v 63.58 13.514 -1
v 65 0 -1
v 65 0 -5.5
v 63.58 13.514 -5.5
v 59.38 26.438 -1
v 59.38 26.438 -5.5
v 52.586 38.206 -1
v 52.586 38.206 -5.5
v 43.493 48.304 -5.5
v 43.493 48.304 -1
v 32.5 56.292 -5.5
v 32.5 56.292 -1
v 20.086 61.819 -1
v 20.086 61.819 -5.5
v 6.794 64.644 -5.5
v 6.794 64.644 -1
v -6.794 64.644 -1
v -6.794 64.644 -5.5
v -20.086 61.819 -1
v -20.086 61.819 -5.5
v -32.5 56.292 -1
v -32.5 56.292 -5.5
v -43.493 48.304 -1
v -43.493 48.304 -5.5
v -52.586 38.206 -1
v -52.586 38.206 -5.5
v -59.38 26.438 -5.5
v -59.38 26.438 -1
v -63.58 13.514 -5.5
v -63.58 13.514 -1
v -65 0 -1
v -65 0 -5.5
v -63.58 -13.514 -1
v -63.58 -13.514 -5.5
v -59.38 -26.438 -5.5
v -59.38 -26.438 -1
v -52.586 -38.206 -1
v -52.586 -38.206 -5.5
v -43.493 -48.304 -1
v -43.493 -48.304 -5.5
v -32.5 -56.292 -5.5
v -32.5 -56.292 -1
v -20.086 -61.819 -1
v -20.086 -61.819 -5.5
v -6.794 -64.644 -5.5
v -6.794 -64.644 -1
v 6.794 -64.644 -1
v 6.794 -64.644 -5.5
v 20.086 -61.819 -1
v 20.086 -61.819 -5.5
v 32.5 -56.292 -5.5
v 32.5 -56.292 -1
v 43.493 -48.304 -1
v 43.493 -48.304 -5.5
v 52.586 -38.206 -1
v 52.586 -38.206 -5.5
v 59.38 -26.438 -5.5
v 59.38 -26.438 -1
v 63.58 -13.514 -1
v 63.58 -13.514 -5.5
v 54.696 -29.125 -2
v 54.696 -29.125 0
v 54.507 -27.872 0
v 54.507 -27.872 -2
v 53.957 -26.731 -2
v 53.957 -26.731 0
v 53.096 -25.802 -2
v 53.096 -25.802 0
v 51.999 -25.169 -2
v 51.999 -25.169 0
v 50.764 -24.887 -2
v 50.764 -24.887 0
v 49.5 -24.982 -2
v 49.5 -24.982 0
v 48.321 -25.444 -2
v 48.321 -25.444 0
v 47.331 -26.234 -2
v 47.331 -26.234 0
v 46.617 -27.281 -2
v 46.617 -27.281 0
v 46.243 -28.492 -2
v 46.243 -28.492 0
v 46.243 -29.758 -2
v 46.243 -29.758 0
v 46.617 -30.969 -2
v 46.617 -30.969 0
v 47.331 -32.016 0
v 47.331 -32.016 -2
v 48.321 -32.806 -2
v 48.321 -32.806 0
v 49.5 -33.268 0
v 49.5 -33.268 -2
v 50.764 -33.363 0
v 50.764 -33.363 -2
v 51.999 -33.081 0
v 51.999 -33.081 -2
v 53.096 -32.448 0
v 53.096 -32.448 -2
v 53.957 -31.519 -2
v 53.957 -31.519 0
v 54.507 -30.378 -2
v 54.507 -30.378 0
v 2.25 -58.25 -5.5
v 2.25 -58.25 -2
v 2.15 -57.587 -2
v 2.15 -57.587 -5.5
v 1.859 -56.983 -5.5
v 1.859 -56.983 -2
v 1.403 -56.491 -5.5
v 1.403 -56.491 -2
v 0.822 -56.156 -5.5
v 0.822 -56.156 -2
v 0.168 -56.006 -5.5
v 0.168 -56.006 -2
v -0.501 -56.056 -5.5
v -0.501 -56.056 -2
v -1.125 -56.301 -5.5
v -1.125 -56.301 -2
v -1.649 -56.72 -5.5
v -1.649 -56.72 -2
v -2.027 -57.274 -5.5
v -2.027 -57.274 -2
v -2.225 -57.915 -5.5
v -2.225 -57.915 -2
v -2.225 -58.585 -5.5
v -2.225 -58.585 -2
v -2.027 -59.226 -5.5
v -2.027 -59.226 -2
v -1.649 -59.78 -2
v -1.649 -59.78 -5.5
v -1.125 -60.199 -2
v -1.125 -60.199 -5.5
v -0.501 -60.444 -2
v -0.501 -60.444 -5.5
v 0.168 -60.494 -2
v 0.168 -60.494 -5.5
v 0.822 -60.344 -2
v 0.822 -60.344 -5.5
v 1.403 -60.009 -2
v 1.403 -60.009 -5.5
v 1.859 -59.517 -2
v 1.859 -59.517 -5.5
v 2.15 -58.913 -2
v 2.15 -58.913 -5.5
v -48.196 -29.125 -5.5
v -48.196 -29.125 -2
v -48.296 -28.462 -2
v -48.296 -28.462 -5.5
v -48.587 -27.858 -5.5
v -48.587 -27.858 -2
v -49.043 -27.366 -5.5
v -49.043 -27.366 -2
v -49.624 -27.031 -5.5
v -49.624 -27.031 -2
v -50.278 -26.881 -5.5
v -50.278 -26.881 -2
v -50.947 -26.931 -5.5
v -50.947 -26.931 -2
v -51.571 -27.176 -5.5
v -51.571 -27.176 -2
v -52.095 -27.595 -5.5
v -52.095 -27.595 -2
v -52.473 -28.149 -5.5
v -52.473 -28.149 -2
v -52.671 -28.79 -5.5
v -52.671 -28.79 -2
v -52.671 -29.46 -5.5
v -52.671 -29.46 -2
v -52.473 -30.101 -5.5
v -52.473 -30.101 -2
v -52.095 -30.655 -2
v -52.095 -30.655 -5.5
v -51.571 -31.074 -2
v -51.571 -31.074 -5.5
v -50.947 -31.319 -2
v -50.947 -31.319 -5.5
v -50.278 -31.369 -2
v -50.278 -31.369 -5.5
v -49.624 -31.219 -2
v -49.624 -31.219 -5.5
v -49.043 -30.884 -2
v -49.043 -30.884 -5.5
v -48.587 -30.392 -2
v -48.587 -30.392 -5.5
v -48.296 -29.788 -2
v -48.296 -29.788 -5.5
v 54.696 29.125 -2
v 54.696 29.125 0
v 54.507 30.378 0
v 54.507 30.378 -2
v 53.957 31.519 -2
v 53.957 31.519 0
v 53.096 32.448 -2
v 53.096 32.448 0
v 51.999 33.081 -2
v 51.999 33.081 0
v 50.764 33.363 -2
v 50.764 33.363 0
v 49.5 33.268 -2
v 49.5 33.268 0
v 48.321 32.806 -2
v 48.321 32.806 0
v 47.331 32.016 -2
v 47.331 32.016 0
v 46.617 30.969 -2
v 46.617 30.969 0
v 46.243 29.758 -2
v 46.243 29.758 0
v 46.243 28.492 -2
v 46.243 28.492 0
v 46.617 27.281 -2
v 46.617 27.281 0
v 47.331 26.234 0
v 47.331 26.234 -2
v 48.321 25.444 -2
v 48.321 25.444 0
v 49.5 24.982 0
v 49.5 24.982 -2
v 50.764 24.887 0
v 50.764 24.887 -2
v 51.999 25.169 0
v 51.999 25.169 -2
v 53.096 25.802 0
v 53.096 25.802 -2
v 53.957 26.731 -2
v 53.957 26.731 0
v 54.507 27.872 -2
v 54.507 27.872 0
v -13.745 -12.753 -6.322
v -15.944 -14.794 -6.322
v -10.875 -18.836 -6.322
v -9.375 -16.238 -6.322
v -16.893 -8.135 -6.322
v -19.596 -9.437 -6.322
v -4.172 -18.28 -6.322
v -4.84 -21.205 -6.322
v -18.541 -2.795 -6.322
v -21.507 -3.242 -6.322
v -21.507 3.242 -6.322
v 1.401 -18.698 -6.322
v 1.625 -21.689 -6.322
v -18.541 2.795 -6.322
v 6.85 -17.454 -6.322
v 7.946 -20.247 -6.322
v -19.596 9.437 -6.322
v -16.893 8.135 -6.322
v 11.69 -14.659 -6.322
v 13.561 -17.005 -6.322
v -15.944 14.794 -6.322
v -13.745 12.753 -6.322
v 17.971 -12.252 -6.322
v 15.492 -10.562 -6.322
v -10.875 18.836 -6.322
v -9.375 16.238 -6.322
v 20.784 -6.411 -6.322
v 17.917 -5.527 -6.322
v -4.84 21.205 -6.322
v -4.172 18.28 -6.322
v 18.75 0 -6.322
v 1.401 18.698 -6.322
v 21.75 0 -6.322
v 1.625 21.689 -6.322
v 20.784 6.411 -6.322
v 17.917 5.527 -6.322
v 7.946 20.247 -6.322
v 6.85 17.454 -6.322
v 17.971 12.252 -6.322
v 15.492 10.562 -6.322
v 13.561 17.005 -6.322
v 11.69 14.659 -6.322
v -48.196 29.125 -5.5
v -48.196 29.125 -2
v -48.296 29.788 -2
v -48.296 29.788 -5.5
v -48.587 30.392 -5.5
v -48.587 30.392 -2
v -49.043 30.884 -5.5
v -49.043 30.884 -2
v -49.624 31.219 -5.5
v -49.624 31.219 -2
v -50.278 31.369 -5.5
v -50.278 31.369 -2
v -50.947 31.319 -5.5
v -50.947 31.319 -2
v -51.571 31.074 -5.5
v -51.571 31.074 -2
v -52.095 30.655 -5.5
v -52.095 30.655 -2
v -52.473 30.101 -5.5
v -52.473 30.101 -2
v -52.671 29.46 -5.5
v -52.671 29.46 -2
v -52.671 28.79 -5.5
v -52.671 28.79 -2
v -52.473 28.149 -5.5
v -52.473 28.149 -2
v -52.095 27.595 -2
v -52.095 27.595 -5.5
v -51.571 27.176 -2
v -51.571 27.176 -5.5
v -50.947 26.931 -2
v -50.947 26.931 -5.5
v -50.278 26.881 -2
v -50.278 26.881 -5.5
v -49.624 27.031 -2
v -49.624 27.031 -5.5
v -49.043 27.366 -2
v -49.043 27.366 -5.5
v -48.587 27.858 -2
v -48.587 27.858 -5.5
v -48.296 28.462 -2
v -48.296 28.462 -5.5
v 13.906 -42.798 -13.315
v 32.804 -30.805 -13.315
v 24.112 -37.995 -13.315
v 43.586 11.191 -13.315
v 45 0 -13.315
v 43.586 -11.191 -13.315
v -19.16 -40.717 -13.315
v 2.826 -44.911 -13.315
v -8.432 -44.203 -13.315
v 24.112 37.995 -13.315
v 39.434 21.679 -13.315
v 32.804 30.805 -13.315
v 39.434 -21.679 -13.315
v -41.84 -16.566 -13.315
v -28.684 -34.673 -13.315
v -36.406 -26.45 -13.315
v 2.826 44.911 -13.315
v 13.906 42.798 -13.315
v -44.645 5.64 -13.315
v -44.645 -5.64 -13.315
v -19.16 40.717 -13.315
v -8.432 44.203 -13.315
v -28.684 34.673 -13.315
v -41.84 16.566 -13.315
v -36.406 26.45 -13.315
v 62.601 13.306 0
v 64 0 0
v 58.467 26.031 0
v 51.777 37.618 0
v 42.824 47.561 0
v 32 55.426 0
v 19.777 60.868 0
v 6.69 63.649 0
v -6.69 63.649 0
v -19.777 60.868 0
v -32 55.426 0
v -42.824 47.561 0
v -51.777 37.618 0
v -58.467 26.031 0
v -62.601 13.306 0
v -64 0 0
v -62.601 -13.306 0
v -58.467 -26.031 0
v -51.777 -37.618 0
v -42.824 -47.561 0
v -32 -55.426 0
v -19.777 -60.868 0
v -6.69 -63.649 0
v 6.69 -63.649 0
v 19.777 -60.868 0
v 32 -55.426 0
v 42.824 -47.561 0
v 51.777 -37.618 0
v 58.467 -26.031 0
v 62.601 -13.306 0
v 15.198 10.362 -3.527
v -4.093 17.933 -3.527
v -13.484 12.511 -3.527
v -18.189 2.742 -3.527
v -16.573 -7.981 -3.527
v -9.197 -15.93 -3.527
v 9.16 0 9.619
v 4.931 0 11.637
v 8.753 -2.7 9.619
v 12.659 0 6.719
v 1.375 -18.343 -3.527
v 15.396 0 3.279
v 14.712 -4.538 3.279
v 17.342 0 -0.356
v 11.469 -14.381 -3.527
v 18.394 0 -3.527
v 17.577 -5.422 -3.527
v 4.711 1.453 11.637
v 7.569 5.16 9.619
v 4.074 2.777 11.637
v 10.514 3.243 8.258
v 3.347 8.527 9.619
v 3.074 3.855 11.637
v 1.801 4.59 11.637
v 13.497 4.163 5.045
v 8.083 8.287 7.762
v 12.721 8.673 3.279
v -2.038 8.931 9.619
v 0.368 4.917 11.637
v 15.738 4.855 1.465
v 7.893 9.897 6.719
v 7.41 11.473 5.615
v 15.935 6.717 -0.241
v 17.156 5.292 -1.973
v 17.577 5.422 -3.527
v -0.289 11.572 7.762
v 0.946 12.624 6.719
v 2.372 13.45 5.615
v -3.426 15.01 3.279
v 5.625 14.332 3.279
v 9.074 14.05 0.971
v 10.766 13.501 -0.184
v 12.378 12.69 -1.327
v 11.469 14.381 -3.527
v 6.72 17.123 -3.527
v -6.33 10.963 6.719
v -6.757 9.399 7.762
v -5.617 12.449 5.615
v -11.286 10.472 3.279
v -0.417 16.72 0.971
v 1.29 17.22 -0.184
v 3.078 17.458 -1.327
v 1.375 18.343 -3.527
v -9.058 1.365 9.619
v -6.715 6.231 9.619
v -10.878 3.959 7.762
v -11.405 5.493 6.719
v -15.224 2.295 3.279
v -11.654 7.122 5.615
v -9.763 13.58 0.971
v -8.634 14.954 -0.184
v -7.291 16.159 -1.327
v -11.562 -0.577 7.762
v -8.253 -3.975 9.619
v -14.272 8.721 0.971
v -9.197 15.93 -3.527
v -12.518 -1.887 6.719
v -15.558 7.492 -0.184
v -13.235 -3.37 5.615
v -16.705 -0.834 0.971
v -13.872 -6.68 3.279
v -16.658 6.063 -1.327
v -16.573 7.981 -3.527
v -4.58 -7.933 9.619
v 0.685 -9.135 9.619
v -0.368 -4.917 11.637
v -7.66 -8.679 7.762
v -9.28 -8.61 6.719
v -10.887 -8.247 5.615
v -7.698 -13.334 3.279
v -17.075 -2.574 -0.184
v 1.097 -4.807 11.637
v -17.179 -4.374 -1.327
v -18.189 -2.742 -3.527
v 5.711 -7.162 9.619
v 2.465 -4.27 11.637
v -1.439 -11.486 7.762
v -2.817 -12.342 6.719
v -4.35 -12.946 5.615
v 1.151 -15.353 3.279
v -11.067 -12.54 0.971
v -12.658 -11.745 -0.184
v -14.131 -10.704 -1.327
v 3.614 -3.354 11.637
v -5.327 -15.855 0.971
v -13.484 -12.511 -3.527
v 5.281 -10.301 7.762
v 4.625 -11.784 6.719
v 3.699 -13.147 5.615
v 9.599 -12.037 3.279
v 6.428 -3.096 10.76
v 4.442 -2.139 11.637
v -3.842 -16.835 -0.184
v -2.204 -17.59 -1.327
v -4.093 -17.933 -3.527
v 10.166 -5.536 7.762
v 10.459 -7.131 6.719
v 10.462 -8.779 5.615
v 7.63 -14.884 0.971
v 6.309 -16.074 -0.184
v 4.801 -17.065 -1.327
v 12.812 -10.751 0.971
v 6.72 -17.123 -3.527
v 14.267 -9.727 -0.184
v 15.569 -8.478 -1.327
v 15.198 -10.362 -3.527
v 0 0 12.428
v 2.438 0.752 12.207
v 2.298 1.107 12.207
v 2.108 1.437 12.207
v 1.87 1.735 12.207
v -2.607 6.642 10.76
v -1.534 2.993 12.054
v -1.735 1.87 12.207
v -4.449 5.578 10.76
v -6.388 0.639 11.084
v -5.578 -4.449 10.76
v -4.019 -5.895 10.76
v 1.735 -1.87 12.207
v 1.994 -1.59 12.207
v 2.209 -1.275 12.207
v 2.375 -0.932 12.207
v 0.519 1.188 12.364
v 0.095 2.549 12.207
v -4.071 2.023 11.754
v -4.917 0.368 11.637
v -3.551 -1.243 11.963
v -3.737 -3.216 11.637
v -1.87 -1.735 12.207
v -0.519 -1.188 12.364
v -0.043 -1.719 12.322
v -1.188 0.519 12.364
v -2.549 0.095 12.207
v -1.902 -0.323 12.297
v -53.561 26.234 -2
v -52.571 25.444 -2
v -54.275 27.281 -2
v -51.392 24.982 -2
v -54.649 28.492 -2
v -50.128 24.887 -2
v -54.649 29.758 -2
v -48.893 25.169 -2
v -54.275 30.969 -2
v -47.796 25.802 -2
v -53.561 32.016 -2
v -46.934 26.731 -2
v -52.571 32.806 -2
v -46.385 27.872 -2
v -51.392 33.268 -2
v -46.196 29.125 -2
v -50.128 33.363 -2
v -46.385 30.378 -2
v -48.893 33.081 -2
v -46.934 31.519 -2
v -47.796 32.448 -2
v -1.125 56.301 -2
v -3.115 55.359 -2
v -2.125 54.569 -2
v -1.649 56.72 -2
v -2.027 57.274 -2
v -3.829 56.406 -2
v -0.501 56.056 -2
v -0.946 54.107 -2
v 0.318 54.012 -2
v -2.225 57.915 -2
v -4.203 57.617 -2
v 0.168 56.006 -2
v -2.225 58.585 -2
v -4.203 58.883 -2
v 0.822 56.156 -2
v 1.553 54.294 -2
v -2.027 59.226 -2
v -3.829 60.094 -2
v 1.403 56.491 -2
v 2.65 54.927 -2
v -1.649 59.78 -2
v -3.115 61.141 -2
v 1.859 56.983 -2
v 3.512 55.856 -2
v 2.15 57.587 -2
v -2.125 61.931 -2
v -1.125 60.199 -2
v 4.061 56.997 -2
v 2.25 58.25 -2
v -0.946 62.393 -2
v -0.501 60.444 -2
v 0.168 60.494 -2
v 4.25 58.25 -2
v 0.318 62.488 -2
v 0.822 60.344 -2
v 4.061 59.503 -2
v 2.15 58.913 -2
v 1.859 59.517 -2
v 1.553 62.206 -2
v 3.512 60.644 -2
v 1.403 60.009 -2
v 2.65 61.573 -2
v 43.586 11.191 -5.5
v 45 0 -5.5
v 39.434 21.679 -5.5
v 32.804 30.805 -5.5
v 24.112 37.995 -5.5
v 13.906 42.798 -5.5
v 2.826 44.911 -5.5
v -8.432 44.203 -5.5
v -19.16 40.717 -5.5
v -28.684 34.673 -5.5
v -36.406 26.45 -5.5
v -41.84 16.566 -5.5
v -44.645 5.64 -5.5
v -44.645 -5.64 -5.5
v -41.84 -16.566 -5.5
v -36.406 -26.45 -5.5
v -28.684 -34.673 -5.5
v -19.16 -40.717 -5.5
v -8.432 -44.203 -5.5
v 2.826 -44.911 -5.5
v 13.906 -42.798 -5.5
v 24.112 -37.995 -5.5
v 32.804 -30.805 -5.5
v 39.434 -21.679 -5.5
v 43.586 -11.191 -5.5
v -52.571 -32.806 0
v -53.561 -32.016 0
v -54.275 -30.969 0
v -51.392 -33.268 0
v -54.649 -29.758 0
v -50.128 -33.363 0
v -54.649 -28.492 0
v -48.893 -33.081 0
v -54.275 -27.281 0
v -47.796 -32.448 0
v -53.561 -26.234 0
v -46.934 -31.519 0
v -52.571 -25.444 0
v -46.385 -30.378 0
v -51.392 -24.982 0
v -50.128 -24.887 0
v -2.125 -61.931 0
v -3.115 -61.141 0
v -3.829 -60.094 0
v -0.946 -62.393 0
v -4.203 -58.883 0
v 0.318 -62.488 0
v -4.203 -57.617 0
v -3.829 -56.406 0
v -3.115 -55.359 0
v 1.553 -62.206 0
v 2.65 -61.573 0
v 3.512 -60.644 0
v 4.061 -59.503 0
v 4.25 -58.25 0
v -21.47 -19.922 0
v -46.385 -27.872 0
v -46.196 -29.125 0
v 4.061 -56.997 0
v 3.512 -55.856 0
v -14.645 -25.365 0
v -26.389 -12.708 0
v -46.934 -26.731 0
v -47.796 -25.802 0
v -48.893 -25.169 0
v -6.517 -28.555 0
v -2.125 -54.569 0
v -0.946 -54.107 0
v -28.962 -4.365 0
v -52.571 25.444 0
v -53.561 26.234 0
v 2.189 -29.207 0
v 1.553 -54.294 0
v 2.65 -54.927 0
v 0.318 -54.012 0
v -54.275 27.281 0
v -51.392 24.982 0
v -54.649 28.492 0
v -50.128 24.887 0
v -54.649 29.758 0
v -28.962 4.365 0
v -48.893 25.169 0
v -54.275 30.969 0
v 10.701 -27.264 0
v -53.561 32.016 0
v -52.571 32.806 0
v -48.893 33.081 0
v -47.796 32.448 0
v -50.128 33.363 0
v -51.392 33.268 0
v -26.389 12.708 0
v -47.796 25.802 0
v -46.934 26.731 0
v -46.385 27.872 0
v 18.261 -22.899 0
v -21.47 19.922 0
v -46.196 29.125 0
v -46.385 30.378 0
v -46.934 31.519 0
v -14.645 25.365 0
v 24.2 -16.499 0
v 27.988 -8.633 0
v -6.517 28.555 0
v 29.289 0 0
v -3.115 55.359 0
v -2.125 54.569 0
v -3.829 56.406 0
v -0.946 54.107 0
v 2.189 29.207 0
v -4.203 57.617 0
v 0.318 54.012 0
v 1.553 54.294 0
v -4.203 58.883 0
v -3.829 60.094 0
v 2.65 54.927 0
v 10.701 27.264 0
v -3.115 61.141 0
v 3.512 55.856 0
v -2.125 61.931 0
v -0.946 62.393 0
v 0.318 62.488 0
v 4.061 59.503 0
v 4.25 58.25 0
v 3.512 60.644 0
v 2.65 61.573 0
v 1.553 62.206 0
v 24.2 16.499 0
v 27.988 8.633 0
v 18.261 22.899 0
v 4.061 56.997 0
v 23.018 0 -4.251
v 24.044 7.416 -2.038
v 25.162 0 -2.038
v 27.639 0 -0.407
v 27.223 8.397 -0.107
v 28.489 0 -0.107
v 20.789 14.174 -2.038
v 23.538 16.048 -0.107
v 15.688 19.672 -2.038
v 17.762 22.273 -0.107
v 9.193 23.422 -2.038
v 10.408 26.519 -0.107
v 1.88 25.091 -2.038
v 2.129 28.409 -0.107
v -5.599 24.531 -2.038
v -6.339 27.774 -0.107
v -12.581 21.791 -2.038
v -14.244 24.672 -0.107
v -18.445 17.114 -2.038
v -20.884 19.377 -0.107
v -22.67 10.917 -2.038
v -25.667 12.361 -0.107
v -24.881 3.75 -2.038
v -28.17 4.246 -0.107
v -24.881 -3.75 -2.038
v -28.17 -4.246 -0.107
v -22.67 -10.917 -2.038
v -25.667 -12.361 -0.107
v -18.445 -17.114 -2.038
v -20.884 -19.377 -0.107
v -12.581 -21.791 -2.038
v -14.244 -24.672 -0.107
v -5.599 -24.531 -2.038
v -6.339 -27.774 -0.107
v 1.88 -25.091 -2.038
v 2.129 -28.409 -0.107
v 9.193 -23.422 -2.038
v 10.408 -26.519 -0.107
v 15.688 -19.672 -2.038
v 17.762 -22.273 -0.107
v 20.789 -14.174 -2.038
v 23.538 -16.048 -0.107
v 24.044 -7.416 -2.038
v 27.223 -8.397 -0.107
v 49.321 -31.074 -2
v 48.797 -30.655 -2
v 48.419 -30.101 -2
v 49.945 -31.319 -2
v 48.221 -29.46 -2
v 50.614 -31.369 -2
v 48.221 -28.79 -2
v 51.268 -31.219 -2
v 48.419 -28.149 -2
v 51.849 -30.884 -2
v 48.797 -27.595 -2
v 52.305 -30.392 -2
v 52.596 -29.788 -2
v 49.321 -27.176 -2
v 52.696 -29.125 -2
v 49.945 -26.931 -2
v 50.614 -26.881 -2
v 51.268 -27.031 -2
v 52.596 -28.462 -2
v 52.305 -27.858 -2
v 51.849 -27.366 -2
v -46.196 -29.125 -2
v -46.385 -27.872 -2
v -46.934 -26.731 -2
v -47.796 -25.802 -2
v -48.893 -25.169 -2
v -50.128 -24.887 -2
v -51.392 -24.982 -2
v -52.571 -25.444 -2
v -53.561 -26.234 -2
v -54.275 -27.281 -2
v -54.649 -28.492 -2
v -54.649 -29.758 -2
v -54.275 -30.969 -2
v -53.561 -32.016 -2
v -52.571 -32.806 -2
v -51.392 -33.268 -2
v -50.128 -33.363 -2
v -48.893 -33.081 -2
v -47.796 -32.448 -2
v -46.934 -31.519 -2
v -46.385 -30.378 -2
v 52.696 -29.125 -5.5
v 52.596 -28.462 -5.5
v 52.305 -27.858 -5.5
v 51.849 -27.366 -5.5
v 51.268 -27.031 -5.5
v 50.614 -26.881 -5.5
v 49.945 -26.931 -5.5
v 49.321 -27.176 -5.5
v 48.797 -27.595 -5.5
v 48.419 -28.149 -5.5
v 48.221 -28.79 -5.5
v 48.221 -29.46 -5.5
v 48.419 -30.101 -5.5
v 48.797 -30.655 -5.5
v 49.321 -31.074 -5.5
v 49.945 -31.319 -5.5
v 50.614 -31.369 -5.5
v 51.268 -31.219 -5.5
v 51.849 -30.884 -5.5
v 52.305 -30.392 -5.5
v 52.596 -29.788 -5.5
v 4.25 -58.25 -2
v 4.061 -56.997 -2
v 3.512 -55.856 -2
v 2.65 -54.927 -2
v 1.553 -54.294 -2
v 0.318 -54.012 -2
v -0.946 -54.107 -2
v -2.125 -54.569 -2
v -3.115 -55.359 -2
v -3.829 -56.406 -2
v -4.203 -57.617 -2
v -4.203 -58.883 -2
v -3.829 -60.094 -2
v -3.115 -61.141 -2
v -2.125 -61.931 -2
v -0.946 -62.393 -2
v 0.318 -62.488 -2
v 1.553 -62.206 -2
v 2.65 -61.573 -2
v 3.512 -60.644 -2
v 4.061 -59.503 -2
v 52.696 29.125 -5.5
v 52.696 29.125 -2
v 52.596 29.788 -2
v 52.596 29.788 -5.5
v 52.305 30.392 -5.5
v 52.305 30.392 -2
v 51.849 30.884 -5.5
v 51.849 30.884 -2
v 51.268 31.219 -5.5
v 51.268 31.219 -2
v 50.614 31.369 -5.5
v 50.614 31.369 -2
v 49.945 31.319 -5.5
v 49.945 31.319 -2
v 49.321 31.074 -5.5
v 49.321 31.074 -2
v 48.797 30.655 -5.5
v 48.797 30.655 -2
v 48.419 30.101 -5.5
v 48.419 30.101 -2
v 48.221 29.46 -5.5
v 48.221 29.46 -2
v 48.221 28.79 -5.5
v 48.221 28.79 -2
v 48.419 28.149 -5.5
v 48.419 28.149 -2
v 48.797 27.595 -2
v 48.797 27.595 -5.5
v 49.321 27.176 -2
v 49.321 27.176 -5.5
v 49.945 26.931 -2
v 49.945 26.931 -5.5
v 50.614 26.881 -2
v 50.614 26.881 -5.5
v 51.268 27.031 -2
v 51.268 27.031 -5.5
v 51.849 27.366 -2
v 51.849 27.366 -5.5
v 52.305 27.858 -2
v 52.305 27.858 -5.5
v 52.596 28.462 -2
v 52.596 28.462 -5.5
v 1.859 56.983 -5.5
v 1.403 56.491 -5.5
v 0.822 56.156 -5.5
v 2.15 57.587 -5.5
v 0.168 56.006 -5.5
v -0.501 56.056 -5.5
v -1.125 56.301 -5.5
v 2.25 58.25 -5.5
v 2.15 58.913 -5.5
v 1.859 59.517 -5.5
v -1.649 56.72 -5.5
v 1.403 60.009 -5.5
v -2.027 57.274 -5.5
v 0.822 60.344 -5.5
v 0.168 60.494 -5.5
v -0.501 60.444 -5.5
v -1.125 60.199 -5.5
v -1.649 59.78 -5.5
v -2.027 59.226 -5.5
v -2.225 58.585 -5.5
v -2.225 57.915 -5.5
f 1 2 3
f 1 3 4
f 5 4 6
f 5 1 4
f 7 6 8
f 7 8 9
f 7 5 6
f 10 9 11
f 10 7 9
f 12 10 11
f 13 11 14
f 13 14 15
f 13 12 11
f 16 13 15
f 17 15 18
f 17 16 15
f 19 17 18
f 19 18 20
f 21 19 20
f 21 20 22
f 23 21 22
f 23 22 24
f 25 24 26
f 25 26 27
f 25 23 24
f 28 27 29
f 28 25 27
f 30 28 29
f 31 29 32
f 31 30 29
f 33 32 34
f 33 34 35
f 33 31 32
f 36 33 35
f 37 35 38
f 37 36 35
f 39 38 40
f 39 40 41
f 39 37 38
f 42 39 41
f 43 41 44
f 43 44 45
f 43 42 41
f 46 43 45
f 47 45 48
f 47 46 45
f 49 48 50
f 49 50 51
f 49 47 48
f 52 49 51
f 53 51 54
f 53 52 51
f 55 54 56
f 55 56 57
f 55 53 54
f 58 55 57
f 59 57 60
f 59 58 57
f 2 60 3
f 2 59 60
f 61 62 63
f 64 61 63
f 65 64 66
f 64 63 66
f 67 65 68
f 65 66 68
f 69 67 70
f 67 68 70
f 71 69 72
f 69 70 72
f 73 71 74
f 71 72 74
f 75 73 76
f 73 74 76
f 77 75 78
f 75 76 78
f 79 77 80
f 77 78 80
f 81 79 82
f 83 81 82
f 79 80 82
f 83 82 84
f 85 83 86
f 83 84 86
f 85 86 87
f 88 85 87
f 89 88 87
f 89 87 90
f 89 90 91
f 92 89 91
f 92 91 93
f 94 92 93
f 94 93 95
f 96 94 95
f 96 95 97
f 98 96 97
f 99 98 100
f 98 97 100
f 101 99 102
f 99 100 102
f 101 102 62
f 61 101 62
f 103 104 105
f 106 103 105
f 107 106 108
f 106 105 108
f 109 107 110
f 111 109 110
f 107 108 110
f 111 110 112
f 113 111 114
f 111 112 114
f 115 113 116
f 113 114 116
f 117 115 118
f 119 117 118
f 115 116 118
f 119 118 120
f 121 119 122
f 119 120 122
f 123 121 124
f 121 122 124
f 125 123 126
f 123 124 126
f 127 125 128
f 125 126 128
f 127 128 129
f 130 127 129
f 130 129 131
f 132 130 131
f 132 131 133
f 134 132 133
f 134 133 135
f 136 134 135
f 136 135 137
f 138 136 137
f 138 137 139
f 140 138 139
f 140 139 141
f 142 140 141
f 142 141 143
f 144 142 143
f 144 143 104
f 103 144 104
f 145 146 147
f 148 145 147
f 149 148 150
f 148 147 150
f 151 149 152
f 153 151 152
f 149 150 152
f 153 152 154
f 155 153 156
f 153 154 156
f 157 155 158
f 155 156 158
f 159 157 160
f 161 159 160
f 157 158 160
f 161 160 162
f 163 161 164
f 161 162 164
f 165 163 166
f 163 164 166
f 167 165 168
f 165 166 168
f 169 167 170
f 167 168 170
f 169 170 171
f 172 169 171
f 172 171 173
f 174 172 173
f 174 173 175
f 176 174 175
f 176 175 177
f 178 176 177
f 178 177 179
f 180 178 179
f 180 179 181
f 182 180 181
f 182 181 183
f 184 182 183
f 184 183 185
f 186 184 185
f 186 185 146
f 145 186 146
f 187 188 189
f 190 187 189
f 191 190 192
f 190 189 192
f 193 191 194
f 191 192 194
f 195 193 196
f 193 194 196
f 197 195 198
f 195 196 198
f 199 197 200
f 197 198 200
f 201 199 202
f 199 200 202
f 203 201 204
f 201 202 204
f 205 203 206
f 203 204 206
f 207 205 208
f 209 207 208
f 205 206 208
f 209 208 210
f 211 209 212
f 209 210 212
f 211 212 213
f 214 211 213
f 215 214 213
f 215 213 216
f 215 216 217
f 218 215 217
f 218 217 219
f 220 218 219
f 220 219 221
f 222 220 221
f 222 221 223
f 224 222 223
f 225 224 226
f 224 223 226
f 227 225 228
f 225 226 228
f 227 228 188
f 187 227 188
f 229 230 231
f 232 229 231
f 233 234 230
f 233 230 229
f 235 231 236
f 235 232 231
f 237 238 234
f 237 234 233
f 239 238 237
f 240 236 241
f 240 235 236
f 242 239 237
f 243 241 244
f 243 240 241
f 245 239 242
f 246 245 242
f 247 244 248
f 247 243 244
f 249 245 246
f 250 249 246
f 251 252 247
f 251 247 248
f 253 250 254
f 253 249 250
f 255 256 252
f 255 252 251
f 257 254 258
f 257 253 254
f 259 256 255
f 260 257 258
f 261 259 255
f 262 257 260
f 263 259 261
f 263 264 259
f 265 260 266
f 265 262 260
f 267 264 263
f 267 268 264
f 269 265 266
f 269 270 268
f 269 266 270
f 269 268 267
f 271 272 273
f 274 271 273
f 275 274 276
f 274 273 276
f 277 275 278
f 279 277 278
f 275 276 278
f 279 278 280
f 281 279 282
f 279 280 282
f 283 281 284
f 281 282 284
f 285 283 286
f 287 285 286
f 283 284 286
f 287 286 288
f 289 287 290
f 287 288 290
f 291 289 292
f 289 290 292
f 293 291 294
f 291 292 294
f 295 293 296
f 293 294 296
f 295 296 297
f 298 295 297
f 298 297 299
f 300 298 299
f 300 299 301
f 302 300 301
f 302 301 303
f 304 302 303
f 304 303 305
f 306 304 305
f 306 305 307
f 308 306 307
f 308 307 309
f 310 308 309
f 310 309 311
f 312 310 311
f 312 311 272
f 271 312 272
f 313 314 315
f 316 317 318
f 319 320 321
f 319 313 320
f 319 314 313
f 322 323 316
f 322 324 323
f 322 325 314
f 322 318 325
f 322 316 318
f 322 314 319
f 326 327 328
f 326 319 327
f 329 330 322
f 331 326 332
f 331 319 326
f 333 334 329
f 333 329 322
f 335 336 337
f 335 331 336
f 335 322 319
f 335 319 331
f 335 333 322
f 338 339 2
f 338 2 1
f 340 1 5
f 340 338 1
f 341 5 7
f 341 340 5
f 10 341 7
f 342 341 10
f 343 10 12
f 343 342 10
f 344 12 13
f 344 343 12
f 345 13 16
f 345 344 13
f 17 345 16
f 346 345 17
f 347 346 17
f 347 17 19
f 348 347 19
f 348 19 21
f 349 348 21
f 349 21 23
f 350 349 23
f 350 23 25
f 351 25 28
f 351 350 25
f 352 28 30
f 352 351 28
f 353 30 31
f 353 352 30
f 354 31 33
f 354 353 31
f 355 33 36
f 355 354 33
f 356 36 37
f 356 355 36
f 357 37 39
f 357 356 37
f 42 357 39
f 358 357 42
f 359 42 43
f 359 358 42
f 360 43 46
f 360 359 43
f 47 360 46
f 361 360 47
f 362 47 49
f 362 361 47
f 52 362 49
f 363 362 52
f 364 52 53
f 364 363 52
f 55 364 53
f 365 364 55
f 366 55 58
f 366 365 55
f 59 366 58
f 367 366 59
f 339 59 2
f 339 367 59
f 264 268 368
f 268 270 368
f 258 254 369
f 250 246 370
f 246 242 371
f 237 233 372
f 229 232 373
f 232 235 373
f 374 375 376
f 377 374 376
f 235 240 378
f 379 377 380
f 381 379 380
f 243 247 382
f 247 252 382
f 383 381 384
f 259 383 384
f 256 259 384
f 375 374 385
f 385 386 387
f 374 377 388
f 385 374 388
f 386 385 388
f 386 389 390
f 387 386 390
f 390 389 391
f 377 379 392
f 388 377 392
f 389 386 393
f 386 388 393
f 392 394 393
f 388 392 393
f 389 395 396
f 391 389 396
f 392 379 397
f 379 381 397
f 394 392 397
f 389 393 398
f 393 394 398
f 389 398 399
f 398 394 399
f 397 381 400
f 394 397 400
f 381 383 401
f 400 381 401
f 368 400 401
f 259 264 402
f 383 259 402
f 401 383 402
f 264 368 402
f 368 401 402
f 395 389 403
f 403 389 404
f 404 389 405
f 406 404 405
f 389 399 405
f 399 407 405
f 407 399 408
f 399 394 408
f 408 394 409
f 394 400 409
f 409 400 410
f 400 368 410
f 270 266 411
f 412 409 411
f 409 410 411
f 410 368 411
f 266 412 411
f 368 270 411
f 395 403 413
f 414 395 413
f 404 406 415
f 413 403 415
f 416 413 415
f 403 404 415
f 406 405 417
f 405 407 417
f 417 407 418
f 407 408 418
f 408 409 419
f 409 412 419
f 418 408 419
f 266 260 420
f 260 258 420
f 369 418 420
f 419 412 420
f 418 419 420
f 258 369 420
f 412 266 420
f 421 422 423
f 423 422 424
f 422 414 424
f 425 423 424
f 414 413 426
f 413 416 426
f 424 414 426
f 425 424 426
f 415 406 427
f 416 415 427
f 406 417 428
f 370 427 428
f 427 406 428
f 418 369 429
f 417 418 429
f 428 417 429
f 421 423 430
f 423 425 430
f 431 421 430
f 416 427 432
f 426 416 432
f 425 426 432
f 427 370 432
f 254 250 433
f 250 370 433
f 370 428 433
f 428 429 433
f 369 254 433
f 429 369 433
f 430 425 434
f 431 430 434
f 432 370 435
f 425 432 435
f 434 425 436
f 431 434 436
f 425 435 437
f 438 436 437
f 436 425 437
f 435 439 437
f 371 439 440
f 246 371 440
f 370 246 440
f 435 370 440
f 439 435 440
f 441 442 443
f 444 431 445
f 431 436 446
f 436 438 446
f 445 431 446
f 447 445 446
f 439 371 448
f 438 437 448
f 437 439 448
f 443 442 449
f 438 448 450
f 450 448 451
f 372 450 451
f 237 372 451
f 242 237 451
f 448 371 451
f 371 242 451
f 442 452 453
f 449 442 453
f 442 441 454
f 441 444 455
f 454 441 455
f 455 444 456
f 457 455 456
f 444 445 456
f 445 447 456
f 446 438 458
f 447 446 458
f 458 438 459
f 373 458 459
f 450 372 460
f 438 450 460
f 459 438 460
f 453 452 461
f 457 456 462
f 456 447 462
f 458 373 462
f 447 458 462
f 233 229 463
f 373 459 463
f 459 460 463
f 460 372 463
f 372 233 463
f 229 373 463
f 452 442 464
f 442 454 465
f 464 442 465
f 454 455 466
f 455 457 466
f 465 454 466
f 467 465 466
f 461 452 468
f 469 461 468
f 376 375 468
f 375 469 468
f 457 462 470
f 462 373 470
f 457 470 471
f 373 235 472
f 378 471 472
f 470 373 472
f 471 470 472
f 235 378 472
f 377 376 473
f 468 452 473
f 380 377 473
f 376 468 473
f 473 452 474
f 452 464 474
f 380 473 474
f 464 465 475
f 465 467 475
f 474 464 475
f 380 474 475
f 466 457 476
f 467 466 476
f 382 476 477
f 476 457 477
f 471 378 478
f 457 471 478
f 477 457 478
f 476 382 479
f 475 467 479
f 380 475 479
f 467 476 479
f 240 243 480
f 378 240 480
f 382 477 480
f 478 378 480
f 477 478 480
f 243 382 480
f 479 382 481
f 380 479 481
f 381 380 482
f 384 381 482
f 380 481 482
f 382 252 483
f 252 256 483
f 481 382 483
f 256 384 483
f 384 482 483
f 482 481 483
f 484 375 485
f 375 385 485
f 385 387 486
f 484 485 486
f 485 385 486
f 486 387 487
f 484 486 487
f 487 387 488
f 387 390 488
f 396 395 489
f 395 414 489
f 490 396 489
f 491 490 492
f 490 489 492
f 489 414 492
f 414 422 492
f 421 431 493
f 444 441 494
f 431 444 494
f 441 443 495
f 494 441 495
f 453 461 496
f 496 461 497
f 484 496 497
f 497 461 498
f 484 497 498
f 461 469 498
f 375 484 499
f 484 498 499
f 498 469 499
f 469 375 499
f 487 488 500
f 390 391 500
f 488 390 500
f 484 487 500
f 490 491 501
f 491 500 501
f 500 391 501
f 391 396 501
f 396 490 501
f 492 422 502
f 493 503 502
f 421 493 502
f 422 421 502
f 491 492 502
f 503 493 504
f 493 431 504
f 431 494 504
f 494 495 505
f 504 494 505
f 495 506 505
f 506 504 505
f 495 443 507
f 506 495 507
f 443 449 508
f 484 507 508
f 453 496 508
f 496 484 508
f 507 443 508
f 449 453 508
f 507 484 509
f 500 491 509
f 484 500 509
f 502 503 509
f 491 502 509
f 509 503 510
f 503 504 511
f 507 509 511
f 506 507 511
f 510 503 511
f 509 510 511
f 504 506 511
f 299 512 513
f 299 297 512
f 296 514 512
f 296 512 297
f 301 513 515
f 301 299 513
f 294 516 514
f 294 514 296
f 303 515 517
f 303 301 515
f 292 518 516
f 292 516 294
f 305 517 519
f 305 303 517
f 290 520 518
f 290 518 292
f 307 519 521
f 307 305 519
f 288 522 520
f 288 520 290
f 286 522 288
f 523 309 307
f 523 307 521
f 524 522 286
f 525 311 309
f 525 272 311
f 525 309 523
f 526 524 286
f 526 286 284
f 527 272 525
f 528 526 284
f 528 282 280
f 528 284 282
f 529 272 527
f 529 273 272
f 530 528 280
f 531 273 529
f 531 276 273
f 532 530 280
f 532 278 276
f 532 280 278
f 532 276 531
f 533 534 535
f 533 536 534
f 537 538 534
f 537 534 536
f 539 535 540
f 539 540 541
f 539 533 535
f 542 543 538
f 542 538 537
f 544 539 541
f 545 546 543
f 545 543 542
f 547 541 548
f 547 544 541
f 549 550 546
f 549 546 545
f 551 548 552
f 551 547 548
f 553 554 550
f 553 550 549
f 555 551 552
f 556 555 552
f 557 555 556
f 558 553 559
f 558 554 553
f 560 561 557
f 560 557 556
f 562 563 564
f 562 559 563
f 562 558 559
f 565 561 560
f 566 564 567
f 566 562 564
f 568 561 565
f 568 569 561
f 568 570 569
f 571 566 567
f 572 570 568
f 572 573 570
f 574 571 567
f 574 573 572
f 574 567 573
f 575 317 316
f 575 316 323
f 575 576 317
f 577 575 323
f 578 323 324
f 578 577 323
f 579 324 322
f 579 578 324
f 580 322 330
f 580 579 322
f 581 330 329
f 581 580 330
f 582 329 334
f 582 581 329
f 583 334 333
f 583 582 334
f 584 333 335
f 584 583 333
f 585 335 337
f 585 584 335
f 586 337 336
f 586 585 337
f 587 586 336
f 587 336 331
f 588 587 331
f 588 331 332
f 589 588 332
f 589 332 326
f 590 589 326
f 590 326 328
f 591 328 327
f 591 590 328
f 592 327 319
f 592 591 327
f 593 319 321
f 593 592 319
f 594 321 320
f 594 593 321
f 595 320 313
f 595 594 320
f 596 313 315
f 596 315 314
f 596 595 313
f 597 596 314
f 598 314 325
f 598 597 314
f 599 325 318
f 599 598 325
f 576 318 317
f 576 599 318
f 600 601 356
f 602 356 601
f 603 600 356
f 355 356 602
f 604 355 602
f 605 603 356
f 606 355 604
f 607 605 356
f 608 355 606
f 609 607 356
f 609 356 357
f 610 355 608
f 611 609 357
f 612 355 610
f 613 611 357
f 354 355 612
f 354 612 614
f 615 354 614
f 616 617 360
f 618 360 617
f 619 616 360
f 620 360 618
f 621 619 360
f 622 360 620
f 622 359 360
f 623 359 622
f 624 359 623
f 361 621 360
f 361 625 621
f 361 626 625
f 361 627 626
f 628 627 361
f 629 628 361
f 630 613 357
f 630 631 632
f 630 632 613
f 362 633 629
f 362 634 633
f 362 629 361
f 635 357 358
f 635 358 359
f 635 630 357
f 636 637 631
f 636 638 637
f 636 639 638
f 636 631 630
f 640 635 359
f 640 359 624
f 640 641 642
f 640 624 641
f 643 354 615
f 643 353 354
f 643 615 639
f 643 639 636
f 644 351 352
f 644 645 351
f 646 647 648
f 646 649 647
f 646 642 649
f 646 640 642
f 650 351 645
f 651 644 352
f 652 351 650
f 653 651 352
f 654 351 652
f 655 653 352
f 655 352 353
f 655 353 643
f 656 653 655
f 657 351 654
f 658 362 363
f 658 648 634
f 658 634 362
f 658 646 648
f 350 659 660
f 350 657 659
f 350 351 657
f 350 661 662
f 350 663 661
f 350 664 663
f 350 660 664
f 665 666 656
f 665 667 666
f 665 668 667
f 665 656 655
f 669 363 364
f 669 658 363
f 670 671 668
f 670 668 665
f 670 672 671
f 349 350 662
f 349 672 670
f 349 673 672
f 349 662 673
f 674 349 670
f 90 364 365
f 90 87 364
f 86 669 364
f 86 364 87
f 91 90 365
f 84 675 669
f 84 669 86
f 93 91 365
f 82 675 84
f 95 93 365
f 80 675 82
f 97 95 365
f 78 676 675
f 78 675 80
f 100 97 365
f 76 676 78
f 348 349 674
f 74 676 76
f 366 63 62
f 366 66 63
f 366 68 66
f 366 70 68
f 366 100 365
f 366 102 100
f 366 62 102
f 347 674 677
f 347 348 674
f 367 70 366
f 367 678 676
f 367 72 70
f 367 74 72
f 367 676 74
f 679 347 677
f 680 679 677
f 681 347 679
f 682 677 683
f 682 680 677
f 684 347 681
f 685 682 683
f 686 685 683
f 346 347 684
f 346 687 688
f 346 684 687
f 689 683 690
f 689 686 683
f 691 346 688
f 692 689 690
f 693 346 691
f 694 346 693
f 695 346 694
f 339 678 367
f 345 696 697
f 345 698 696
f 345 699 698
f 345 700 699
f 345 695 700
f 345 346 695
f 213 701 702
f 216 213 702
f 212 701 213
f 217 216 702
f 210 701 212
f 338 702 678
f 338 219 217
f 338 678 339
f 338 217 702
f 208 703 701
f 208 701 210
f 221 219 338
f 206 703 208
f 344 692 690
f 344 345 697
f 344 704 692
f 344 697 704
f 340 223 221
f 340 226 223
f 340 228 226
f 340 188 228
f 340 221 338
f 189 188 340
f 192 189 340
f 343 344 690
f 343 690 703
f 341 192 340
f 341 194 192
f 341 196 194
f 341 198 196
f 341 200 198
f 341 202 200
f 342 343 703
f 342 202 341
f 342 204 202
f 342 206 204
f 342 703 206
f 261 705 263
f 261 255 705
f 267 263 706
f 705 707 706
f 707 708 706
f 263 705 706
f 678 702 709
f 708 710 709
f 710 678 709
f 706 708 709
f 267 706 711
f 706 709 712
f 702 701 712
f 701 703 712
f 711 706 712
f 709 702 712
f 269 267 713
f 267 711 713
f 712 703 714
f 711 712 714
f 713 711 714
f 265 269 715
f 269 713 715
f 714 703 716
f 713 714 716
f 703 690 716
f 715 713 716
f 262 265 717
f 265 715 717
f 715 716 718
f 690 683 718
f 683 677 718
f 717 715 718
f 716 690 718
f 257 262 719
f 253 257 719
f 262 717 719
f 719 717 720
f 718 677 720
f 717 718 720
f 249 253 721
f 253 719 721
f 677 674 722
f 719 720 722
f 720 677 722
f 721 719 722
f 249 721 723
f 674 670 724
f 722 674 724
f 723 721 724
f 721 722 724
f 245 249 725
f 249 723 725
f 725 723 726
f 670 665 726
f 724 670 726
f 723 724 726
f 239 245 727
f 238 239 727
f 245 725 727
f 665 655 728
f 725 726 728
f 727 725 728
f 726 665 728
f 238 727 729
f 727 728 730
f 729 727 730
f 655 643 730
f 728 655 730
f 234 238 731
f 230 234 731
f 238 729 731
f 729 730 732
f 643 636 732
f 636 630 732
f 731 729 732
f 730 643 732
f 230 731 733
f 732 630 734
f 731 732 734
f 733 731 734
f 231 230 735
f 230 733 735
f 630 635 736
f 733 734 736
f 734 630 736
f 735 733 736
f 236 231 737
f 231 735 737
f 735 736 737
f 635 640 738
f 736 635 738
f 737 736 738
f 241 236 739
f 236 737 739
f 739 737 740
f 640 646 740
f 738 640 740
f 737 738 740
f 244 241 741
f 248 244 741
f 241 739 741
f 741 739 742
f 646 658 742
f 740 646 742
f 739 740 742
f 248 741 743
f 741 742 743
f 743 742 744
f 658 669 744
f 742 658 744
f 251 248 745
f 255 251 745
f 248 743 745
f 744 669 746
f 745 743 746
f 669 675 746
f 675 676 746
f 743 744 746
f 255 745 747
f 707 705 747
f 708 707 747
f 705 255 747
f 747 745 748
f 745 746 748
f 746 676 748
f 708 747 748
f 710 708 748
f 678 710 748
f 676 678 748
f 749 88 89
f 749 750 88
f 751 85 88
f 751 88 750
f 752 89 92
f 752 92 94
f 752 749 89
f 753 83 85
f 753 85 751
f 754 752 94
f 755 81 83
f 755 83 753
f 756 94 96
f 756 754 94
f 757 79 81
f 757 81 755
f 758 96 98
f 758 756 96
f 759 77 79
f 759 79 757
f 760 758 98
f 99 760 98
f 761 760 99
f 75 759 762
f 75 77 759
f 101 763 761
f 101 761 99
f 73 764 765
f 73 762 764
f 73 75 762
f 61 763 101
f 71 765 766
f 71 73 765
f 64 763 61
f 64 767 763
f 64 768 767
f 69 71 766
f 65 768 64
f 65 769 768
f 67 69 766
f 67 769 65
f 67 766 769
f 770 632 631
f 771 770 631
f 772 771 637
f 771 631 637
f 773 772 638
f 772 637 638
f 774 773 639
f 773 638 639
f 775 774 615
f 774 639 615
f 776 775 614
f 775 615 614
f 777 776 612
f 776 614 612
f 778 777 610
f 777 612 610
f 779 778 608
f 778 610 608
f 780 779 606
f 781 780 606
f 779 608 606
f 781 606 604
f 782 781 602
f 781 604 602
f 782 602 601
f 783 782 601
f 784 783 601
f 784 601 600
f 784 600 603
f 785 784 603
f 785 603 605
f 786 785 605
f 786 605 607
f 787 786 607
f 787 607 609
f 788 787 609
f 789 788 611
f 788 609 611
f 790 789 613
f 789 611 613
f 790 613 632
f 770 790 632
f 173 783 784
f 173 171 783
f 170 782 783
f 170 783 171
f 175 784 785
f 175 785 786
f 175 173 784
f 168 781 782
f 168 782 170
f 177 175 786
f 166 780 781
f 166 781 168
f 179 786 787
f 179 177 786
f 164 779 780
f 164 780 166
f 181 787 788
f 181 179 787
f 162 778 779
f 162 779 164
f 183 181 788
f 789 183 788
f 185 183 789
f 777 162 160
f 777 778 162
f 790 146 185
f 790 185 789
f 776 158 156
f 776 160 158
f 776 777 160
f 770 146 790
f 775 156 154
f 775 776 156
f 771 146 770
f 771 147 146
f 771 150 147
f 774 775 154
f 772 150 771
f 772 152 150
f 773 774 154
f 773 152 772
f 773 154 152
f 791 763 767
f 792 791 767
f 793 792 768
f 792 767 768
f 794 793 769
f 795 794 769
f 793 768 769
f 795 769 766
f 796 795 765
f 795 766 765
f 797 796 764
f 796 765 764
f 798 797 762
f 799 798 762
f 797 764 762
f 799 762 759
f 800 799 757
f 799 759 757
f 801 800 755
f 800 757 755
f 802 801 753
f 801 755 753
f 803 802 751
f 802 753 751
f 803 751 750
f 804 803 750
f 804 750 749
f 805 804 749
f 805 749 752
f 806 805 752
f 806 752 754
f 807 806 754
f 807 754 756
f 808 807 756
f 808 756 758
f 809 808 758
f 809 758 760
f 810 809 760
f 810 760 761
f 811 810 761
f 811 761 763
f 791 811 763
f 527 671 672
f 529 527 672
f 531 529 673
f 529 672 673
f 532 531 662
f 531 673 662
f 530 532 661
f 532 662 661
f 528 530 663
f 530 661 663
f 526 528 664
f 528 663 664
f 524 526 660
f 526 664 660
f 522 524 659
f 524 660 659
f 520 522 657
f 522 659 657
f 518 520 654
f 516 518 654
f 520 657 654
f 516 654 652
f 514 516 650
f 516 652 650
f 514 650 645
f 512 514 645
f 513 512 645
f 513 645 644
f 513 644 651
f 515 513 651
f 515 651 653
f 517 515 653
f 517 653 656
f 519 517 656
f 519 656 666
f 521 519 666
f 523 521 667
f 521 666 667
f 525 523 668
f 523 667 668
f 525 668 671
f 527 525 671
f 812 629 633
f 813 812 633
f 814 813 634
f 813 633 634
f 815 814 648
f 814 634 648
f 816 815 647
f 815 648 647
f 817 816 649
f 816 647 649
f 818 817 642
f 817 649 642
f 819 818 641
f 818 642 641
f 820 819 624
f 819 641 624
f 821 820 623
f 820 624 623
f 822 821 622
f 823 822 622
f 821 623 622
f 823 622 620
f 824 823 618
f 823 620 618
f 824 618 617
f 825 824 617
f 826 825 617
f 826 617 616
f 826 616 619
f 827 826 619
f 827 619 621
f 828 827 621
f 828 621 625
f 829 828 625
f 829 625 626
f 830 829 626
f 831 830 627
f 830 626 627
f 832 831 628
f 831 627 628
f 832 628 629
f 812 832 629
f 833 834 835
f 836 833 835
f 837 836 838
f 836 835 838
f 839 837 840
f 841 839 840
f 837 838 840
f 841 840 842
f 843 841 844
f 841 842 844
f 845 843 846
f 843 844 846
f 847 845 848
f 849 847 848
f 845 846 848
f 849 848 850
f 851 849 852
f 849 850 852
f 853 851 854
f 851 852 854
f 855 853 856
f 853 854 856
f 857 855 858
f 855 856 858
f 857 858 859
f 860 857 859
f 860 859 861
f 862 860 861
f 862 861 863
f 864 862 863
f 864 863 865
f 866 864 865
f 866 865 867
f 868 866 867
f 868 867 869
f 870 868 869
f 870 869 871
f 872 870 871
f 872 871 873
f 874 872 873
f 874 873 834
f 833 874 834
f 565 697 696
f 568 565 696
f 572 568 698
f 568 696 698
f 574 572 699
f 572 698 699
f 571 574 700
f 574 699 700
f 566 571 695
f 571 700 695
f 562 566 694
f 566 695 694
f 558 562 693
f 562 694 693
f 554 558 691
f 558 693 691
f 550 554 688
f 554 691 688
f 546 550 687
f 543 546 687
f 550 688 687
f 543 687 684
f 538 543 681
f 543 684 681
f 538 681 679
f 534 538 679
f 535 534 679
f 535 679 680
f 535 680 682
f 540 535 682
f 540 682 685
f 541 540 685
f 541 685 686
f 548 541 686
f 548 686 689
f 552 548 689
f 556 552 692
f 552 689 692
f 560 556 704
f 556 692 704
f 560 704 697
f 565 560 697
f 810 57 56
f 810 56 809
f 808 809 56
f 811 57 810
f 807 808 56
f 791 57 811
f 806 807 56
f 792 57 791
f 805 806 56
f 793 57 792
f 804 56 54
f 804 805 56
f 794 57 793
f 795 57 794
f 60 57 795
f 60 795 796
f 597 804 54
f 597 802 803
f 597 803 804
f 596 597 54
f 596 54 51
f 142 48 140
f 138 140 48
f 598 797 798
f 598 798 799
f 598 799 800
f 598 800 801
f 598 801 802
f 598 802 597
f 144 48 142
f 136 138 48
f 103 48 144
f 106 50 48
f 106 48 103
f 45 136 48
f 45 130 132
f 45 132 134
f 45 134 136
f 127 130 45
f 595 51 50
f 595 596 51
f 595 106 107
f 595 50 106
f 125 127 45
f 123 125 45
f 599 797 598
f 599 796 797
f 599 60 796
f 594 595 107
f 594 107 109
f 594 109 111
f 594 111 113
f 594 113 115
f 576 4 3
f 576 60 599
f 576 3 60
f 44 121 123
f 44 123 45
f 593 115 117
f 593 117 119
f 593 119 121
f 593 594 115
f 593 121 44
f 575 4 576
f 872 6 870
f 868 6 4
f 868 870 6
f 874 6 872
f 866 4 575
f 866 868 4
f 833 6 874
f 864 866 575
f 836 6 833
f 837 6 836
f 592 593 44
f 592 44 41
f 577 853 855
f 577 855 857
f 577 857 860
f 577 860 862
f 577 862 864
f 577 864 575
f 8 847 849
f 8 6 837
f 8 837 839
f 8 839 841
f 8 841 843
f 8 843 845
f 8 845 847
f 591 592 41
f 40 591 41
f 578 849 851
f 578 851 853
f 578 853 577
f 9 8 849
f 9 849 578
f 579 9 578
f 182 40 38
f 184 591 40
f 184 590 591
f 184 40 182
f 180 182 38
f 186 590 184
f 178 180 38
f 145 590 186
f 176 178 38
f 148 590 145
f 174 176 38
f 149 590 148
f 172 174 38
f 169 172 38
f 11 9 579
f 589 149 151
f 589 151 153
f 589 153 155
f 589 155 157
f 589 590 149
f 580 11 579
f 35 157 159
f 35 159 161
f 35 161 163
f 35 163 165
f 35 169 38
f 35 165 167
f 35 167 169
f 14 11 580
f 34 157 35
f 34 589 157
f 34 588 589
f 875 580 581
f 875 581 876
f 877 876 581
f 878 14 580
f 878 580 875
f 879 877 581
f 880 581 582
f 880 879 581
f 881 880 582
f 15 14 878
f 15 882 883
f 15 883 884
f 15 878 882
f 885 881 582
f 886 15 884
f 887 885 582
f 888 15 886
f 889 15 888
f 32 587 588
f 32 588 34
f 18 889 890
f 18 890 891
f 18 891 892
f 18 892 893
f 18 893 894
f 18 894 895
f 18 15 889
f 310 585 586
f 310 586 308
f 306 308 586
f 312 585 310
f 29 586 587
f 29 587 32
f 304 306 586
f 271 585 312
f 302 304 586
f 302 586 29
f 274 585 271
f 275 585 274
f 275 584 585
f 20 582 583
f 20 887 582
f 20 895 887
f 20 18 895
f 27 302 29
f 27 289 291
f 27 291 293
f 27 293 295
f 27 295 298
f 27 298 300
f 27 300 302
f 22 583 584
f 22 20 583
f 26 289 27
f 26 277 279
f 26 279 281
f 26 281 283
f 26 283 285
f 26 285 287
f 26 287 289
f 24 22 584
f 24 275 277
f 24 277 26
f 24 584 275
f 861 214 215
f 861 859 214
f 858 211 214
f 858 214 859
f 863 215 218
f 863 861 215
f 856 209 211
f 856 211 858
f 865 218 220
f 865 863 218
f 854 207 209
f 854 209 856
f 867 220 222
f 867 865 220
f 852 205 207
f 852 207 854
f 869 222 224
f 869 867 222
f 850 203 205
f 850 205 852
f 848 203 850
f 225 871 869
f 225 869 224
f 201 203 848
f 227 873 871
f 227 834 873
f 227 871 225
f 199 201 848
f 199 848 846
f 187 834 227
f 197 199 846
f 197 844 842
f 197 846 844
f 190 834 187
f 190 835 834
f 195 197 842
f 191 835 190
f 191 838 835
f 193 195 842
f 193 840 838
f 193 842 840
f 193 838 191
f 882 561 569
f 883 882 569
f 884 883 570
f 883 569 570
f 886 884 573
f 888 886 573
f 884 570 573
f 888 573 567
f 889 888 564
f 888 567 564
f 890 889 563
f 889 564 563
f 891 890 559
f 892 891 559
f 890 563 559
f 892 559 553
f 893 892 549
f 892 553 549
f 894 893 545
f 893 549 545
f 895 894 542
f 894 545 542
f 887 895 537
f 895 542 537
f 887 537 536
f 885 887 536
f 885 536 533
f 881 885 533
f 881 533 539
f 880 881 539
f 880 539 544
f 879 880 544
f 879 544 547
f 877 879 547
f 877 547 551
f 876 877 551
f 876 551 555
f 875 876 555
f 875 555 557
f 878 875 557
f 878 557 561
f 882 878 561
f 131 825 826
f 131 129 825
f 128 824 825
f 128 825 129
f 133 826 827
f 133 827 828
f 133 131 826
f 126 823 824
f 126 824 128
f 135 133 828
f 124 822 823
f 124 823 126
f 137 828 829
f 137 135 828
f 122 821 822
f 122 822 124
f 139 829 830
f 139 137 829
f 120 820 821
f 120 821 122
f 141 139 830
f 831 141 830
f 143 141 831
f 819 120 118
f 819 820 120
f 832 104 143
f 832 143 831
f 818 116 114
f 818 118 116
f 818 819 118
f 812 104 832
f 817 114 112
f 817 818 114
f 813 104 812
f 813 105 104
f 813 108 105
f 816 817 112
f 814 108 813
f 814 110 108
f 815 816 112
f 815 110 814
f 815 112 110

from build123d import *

# Parameters (mm, degrees)
F2_R     = 2.25
F3_DEPTH = 25
F2_R_2   = 4.25
F4_DEPTH = 2
F5_SIZE  = 1


with BuildPart() as f1:
    # F0 (on Front) → F1 (revolve)
    with BuildSketch(Plane.XZ):
        with BuildLine():
            Line((65, -5.5), (65, 0))
            Line((65, 0), (29.289105, 0))
            add(Edge.make_bspline(
                [(21.75, -6.322154), (22.552238, -4.150534), (26.594359, 0), (29.289105, 0)],
                knots=[0, 0, 0, 0, 9.839092, 9.839092, 9.839092, 9.839092], degree=3))
            Line((21.75, -6.322154), (18.75, -6.322154))
            add(Edge.make_bspline(
                [(0, 12.427846), (11.965546, 12.285027), (18.75, 0), (18.75, -6.322154)],
                knots=[0, 0, 0, 0, 26.516504, 26.516504, 26.516504, 26.516504], degree=3))
            Line((0, 12.427846), (0, -13.315069))
            Line((0, -13.315069), (45, -13.315069))
            Line((45, -13.315069), (45, -5.5))
            Line((45, -5.5), (65, -5.5))
        make_face()
    revolve(axis=Axis((0, 0, -0.443612), (0, 0, 1)))

    # F2 (on face) → F3 (cut)
    with BuildSketch(Plane.XY):
        with Locations((-50.44598, 29.125)):
            Circle(F2_R)
        with Locations((0, 58.25)):
            Circle(F2_R)
        with Locations((50.44598, 29.125)):
            Circle(F2_R)
        with Locations((50.44598, -29.125)):
            Circle(F2_R)
        with Locations((0, -58.25)):
            Circle(F2_R)
        with Locations((-50.44598, -29.125)):
            Circle(F2_R)
    extrude(amount=-F3_DEPTH, mode=Mode.SUBTRACT)

    # F2 (on face) → F4 (cut)
    with BuildSketch(Plane.XY):
        with Locations((-50.44598, 29.125)):
            Circle(F2_R_2)
        with Locations((-50.44598, 29.125)):
            Circle(F2_R, mode=Mode.SUBTRACT)
        with Locations((0, 58.25)):
            Circle(F2_R_2)
        with Locations((0, 58.25)):
            Circle(F2_R, mode=Mode.SUBTRACT)
        with Locations((50.44598, 29.125)):
            Circle(F2_R_2)
        with Locations((50.44598, 29.125)):
            Circle(F2_R, mode=Mode.SUBTRACT)
        with Locations((50.44598, -29.125)):
            Circle(F2_R_2)
        with Locations((50.44598, -29.125)):
            Circle(F2_R, mode=Mode.SUBTRACT)
        with Locations((0, -58.25)):
            Circle(F2_R_2)
        with Locations((0, -58.25)):
            Circle(F2_R, mode=Mode.SUBTRACT)
        with Locations((-50.44598, -29.125)):
            Circle(F2_R_2)
        with Locations((-50.44598, -29.125)):
            Circle(F2_R, mode=Mode.SUBTRACT)
    extrude(amount=-F4_DEPTH, mode=Mode.SUBTRACT)

    # F5
    f5_edges = [f1.edges().sort_by_distance(p)[0] for p in [
        (-65, 0, 0),
    ]]
    chamfer(f5_edges, length=F5_SIZE)


solid = f1.part
